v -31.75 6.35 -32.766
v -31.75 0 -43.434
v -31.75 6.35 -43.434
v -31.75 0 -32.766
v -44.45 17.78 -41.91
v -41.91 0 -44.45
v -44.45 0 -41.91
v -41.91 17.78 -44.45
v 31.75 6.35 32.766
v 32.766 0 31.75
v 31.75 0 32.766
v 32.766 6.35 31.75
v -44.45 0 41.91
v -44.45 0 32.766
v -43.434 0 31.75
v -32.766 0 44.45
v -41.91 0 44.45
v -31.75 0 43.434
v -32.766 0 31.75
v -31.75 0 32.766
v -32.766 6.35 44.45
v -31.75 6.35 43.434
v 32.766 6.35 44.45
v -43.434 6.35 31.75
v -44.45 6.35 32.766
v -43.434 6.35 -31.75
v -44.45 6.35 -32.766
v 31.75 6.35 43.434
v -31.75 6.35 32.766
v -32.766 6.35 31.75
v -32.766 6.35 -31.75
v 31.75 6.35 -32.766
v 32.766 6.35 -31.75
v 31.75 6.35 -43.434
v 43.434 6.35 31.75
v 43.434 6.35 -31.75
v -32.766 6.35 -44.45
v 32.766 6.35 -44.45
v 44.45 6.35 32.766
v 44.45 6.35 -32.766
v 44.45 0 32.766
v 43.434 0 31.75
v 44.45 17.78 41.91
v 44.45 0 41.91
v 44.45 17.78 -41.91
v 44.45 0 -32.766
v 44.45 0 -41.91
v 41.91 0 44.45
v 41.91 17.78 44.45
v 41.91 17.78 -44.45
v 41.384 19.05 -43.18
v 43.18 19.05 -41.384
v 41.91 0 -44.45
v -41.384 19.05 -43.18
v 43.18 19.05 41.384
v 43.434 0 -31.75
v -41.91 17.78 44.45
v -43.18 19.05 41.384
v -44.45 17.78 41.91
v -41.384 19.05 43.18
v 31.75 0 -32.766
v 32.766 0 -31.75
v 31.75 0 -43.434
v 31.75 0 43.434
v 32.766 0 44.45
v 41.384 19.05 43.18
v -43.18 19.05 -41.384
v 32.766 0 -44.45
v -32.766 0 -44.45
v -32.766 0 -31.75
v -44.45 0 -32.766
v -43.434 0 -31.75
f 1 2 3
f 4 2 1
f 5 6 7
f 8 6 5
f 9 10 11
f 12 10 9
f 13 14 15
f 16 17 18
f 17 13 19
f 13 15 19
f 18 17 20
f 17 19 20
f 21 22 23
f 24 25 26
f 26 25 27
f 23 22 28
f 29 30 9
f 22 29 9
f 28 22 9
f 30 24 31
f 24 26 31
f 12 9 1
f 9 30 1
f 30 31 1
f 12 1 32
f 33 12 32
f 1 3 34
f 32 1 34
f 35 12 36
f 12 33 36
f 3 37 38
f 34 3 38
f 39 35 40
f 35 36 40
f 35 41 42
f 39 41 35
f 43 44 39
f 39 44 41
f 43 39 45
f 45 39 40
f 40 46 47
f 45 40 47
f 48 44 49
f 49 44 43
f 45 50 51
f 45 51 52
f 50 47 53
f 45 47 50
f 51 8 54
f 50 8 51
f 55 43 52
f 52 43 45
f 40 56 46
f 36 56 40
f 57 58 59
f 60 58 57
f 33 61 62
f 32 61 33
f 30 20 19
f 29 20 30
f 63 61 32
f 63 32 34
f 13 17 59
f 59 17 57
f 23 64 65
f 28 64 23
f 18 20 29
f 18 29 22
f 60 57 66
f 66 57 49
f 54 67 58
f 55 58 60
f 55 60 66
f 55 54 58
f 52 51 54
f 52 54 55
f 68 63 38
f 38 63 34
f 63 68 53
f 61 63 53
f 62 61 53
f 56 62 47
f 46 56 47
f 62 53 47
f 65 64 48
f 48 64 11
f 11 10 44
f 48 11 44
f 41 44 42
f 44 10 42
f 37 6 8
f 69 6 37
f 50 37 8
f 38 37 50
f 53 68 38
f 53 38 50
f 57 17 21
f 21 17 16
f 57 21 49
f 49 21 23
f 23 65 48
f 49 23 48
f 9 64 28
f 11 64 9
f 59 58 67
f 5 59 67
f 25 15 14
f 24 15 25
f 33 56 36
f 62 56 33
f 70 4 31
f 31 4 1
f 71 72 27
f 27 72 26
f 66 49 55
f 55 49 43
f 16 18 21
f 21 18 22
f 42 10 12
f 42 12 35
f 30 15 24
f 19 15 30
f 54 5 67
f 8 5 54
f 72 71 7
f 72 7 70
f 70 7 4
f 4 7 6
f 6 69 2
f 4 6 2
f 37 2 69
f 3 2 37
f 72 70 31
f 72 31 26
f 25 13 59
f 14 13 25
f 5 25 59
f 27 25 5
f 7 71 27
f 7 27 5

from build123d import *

# Parameters (mm, degrees)
SKETCH1_W           = 88.9
SKETCH1_H           = 88.9
BOSS_EXTRUDE1_DEPTH = 19.05
CUT_EXTRUDE1_DEPTH  = 6.35
LEGS_OUTER_SIZE     = 2.54
TOP_FACE_SIZE       = 1.27
LEGS_INNER_SIZE     = 1.016


with BuildPart() as part:
    # Sketch1 → Boss-Extrude1 (new body)
    with BuildSketch(Plane(origin=(0, 0, 0), x_dir=(1, 0, 0), z_dir=(0, 1, 0))):
        Rectangle(SKETCH1_W, SKETCH1_H)
    extrude(amount=BOSS_EXTRUDE1_DEPTH)

    # Sketch1<3> → Cut-Extrude1 (cut)
    with BuildSketch(Plane(origin=(0, 0, 0), x_dir=(1, 0, 0), z_dir=(0, 1, 0))):
        Polygon((-44.45, -31.75), (-31.75, -31.75), (-31.75, -44.45), (31.75, -44.45), (31.75, -31.75), (44.45, -31.75), (44.45, 31.75), (31.75, 31.75), (31.75, 44.45), (-31.75, 44.45), (-31.75, 31.75), (-44.45, 31.75), align=None)
    extrude(amount=CUT_EXTRUDE1_DEPTH, mode=Mode.SUBTRACT)

    # legs, outer
    legs_outer_edges = [part.edges().sort_by_distance(p)[0] for p in [
        (-44.45, 9.525, 44.45),
        (44.45, 9.525, 44.45),
        (44.45, 9.525, -44.45),
        (-44.45, 9.525, -44.45),
    ]]
    chamfer(legs_outer_edges, length=LEGS_OUTER_SIZE)

    # top face
    top_face_edges = [part.edges().sort_by_distance(p)[0] for p in [
        (0, 19.05, -44.45),
        (44.45, 19.05, 0),
        (-44.45, 19.05, 0),
        (0, 19.05, 44.45),
        (-43.18, 19.05, -43.18),
        (-43.18, 19.05, 43.18),
        (43.18, 19.05, 43.18),
        (43.18, 19.05, -43.18),
    ]]
    chamfer(top_face_edges, length=TOP_FACE_SIZE)

    # legs, inner
    legs_inner_edges = [part.edges().sort_by_distance(p)[0] for p in [
        (-44.45, 3.175, 31.75),
        (-44.45, 3.175, -31.75),
        (-31.75, 3.175, -31.75),
        (-31.75, 3.175, -44.45),
        (31.75, 3.175, -44.45),
        (31.75, 3.175, -31.75),
        (44.45, 3.175, -31.75),
        (44.45, 3.175, 31.75),
        (31.75, 3.175, 31.75),
        (31.75, 3.175, 44.45),
        (-31.75, 3.175, 44.45),
        (-31.75, 3.175, 31.75),
    ]]
    chamfer(legs_inner_edges, length=LEGS_INNER_SIZE)


solid = part.part
